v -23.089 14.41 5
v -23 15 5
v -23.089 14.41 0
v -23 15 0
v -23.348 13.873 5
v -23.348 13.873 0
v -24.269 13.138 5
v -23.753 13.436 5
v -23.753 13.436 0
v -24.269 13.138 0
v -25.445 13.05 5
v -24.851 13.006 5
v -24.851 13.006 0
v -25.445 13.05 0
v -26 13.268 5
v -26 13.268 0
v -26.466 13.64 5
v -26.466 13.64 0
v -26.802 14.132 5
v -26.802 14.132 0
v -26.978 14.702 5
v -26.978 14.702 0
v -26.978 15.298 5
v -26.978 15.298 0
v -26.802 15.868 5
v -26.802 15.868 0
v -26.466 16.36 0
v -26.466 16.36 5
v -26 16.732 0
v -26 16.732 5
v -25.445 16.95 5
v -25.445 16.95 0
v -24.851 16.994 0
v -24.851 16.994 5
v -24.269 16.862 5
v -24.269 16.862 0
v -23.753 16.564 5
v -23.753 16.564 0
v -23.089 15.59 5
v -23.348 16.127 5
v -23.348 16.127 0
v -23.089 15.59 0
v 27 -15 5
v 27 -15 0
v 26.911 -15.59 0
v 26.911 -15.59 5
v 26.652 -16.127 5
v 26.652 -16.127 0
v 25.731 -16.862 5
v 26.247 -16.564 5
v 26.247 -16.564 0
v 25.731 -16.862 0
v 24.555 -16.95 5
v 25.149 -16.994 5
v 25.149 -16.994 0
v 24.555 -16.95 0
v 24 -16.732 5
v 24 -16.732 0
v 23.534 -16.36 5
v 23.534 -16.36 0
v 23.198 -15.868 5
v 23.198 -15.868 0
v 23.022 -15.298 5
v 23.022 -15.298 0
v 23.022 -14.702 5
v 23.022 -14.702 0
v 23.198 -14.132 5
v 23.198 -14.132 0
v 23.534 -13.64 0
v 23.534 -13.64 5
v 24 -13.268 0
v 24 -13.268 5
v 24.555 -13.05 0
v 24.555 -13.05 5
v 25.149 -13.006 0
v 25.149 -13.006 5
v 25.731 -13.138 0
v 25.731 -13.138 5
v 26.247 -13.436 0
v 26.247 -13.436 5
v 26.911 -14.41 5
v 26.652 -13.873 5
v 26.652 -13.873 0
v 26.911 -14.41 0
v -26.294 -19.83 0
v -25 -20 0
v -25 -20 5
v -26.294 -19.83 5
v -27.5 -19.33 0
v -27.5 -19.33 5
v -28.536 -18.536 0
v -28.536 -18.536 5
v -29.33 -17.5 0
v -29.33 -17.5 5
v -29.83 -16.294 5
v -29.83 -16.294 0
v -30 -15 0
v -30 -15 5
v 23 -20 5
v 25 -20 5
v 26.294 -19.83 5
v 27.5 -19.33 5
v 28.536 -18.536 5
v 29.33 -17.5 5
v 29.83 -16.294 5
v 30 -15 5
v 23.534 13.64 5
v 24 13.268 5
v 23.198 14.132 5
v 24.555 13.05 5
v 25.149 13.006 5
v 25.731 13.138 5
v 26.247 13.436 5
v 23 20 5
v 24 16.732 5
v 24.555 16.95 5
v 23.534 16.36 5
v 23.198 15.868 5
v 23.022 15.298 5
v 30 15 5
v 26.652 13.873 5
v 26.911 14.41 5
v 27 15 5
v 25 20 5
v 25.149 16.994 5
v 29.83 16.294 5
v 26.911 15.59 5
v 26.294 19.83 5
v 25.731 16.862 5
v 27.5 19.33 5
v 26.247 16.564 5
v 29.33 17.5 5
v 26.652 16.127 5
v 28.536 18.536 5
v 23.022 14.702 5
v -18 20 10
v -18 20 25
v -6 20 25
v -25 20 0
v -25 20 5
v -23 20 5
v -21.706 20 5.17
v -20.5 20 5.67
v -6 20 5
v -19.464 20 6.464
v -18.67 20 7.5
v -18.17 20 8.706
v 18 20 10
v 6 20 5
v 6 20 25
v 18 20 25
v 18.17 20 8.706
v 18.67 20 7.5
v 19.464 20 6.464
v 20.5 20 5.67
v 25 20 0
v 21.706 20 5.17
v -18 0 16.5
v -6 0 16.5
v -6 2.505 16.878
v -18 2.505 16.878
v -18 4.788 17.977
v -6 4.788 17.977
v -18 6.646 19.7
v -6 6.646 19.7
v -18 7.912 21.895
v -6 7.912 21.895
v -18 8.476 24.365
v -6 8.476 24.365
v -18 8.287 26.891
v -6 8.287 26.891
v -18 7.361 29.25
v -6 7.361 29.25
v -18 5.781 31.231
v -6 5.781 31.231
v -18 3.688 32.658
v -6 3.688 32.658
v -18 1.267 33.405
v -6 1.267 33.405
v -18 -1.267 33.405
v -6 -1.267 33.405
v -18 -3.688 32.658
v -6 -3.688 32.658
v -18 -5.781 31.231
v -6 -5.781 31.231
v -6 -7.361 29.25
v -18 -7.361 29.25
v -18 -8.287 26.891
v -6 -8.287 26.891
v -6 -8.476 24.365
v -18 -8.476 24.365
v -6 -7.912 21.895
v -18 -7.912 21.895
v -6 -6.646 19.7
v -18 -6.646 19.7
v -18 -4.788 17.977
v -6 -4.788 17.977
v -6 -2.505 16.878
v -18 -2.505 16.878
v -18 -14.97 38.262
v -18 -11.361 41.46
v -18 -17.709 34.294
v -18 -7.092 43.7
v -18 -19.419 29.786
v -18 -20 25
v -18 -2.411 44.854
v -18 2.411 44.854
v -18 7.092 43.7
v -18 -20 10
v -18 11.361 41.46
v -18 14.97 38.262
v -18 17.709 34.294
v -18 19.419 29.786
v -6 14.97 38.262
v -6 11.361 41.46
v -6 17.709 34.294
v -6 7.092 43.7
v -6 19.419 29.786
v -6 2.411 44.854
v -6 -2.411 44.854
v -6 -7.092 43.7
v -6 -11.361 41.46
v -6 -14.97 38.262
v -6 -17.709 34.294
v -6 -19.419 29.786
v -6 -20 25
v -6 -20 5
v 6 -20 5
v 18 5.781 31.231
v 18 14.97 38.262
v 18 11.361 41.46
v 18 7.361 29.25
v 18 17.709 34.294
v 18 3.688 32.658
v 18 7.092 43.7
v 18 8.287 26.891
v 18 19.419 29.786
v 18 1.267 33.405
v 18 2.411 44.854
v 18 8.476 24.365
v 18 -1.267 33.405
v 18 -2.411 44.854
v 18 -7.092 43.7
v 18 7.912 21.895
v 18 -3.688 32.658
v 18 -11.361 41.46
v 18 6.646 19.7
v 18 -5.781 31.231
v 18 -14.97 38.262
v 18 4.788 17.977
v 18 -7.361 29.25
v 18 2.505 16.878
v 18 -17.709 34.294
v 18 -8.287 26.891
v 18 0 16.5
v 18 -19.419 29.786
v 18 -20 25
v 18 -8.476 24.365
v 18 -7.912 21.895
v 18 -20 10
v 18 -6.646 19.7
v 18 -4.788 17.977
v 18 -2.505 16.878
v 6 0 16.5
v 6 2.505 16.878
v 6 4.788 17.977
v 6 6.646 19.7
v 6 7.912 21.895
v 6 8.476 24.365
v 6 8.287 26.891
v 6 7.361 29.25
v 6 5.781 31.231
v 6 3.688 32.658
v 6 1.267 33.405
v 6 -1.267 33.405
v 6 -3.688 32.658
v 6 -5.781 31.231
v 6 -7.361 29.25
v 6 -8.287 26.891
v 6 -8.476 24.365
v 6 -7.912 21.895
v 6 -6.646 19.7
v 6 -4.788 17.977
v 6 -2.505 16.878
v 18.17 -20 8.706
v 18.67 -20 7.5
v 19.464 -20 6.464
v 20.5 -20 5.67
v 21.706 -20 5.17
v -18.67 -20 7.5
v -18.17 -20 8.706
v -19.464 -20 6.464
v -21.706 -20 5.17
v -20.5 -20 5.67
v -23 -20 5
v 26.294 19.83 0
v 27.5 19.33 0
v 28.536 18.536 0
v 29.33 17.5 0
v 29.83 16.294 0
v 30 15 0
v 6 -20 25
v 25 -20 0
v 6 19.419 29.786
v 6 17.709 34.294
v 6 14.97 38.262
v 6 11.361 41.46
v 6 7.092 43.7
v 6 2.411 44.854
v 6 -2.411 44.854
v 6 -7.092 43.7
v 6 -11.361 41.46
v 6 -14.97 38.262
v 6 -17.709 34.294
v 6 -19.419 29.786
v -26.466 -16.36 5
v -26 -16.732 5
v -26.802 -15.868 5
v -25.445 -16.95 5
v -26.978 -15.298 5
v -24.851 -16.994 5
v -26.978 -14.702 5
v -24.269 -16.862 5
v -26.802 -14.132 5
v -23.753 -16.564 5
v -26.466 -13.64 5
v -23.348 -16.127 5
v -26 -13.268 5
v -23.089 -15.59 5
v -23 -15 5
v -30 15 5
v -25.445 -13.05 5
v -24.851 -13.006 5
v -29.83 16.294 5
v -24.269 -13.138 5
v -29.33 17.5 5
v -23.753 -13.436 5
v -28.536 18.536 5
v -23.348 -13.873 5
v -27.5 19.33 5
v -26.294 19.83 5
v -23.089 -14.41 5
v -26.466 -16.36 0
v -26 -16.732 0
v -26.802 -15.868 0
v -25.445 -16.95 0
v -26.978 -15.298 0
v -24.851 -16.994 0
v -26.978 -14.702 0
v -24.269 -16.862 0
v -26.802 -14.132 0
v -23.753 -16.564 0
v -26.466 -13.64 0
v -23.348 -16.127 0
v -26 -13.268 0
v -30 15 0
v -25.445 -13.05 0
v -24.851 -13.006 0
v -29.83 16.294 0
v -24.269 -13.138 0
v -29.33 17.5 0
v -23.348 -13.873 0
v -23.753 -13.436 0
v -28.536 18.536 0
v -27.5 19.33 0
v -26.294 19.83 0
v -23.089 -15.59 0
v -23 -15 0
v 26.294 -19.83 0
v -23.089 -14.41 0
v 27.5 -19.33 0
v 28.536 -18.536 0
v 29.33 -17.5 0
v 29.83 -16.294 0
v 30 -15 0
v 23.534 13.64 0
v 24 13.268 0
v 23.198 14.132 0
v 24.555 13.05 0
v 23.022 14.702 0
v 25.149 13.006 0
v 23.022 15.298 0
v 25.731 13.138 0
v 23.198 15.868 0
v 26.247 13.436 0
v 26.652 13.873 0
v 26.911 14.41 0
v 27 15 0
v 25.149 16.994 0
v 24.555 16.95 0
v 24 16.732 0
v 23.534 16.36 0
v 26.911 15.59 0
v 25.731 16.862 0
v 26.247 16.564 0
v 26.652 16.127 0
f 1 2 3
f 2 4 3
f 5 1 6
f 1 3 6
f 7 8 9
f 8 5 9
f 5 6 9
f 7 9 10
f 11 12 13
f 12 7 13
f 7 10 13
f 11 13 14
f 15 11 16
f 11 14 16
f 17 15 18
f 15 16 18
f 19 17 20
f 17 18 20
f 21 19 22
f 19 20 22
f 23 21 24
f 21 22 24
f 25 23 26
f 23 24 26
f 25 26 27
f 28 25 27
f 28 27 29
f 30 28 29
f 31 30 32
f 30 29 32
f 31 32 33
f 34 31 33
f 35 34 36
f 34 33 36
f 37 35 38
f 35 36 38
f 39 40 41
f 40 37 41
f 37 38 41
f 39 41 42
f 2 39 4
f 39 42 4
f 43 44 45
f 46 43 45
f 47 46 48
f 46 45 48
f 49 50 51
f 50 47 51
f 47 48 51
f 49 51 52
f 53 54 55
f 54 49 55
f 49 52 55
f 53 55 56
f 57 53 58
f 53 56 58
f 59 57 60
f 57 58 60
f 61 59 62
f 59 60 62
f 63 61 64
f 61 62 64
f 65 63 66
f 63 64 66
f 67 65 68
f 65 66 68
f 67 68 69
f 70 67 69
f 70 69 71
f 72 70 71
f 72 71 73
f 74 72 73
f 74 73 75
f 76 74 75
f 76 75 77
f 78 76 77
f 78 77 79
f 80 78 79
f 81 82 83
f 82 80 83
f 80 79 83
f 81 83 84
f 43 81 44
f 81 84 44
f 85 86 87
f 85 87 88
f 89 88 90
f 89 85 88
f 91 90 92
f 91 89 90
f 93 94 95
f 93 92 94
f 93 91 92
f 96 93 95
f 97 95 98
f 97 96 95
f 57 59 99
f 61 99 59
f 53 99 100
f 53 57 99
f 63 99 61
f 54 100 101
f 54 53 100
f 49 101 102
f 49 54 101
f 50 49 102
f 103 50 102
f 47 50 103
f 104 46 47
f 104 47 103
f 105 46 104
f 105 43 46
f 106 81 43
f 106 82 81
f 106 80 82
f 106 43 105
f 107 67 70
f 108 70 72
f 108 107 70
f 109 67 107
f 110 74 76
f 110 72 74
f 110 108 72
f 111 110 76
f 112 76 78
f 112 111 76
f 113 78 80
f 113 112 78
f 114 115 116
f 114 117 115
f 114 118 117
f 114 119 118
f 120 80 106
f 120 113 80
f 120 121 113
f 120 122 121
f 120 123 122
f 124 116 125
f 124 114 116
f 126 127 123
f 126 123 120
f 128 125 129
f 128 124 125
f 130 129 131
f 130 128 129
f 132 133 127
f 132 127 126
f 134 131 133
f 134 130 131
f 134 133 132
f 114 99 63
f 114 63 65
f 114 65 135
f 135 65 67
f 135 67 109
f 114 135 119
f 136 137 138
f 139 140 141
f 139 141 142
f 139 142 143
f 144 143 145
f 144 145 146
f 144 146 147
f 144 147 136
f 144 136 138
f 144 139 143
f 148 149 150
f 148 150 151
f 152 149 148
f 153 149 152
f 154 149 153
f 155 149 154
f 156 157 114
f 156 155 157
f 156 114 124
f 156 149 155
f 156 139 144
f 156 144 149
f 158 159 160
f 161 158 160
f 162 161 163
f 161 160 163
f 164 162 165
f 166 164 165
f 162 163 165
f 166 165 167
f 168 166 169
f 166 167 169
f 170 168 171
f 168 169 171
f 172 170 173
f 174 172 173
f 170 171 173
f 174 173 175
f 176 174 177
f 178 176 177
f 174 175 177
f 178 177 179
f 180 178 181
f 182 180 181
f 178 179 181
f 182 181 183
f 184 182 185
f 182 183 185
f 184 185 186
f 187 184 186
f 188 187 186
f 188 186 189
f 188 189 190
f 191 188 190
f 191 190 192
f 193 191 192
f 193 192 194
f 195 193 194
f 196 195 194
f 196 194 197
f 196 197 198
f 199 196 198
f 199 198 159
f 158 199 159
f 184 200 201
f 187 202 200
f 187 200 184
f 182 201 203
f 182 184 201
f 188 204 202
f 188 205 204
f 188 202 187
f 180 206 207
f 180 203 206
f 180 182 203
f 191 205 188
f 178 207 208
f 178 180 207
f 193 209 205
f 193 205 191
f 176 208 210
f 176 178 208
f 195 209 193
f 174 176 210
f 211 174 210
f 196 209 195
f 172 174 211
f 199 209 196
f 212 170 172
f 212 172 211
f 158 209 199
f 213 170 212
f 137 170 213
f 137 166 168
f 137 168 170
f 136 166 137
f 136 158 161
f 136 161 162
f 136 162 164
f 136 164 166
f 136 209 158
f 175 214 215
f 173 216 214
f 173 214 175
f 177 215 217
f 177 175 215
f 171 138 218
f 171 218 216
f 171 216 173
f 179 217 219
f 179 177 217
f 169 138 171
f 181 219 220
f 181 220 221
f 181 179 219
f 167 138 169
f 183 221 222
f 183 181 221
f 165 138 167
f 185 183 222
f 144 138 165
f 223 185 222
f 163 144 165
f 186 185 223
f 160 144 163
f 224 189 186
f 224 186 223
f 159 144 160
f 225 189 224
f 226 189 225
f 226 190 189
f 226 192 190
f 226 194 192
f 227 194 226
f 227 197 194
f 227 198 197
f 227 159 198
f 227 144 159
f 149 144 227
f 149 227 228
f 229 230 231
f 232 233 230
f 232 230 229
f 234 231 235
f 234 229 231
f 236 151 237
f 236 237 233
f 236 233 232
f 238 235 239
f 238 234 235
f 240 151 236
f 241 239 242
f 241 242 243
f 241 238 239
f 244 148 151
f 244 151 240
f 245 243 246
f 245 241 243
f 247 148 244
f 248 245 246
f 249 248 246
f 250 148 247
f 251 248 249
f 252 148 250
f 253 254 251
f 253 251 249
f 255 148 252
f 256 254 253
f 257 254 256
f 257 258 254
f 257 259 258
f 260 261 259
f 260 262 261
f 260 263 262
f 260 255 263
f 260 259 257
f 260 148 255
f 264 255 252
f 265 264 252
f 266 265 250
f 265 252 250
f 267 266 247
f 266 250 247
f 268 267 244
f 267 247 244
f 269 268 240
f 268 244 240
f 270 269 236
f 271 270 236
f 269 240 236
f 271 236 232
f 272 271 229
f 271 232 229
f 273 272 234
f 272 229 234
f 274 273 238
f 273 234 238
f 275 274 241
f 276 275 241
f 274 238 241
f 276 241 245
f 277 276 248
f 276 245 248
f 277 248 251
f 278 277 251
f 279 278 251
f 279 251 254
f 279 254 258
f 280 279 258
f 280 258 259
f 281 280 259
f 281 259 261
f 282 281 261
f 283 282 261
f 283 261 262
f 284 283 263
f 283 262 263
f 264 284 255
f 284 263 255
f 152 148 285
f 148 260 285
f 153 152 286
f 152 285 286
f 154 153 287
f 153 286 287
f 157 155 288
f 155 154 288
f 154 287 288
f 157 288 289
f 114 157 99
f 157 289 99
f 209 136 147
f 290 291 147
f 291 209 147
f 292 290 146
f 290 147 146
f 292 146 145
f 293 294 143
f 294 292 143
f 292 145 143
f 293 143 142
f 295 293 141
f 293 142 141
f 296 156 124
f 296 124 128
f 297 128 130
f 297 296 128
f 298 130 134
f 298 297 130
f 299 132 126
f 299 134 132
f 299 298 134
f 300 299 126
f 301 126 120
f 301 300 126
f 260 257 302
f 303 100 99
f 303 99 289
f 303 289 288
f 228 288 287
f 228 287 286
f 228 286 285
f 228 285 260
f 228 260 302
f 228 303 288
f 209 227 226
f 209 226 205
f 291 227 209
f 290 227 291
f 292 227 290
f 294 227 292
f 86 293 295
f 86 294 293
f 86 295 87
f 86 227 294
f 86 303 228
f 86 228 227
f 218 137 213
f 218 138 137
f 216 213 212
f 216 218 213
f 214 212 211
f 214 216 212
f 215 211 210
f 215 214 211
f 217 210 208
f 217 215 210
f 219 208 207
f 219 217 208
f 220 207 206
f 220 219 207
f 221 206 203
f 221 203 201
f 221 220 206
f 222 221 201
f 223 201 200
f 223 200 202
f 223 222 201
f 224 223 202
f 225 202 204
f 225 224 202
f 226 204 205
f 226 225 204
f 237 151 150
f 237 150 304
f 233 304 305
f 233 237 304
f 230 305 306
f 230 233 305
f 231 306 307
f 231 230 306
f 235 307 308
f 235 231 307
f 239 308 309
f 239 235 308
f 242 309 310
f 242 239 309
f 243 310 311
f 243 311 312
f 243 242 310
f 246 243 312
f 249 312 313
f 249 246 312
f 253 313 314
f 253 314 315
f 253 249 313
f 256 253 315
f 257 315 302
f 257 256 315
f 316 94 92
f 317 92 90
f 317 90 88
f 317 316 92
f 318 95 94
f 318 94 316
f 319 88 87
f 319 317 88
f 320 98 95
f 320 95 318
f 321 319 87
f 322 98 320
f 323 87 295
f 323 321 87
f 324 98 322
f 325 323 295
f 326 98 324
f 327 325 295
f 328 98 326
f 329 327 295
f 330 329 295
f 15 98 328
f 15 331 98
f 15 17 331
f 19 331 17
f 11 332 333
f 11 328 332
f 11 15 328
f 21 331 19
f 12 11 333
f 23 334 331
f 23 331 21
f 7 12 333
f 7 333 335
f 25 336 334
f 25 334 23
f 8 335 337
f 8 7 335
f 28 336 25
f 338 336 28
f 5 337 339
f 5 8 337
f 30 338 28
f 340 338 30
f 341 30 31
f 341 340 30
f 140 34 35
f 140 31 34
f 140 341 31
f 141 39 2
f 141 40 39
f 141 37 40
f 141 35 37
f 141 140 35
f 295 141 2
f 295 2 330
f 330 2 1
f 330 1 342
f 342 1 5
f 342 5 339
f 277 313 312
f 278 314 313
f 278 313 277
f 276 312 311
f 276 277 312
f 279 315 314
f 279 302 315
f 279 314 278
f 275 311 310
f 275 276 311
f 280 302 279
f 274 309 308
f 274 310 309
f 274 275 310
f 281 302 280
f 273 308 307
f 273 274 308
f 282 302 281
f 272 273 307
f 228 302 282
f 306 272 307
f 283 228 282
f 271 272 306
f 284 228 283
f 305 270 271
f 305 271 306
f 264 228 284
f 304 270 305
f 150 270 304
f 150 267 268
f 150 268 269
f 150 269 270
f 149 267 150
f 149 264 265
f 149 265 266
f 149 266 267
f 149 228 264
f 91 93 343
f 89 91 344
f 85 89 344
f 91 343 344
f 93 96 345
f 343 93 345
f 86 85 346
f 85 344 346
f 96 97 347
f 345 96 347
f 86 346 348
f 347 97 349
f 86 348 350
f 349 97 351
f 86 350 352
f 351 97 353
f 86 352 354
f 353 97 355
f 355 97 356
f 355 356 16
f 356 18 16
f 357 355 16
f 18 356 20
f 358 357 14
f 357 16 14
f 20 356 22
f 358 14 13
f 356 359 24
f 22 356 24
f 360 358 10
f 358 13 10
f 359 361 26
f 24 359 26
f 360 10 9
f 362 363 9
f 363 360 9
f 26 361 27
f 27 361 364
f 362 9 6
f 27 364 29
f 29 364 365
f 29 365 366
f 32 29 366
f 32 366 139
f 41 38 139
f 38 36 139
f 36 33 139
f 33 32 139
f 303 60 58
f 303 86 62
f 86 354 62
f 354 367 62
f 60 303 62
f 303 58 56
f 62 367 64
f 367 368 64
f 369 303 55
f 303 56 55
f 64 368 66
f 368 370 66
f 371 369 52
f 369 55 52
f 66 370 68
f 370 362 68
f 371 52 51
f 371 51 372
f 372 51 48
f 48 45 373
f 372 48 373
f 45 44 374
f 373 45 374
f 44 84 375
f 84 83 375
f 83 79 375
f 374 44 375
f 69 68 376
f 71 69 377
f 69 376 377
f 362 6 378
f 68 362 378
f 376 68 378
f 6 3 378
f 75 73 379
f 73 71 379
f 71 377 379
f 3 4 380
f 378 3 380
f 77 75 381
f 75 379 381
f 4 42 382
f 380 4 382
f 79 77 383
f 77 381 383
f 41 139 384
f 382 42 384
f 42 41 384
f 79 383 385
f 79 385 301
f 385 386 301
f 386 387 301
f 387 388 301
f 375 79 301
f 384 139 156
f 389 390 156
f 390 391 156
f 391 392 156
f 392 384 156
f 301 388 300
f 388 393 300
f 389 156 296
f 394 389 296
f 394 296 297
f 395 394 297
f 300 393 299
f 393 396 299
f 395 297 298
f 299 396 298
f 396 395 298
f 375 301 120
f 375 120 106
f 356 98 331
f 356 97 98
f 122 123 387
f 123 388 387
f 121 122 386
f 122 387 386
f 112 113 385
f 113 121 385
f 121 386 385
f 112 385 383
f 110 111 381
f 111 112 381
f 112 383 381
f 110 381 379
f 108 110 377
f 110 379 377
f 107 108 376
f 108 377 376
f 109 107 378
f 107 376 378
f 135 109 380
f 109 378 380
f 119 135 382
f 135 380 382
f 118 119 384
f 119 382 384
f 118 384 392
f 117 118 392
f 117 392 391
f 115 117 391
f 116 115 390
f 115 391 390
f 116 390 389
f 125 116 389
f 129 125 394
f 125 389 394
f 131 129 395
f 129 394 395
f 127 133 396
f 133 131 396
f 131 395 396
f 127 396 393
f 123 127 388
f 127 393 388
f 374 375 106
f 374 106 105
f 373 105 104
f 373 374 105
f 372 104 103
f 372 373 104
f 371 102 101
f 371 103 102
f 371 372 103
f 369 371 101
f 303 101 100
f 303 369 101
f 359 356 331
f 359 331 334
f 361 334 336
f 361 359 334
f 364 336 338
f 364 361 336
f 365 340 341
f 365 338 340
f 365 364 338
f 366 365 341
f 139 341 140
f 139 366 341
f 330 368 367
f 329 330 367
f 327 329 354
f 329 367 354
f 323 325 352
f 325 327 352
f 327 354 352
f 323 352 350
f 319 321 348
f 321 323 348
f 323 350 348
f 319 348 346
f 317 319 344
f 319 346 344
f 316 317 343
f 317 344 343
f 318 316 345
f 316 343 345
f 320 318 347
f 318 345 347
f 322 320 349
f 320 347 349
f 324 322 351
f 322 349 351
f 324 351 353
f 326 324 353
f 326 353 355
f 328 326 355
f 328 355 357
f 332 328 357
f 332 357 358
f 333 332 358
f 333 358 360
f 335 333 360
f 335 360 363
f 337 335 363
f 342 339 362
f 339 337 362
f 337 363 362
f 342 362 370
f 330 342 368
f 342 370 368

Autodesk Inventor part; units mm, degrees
ref_plane "YZ Plane" through (0, 0, 0) normal (1, 0, 0) x (0, 1, 0)
ref_plane "XZ Plane" through (0, 0, 0) normal (0, 1, 0) x (-1, 0, 0)
ref_plane "XY Plane" through (0, 0, 0) normal (0, 0, 1) x (1, 0, 0)
sketch "Sketch8" plane through (0, 0, 0) normal (0, 0, 1) x (1, 0, 0)
  line L0 (-25, 20) -> (25, 20)
  line L1 (30, 15) -> (30, -15)
  line L2 (25, -20) -> (-25, -20)
  line L3 (-30, -15) -> (-30, 15)
  line L4 (-30, 20) -> (30, -20) construction
  line L5 (30, 20) -> (-30, -20) construction
  line L6 (-25, 15) -> (25, 15) construction
  line L7 (25, 15) -> (25, -15) construction
  line L8 (25, -15) -> (-25, -15) construction
  line L9 (-25, -15) -> (-25, 15) construction
  line L10 (-25, 15) -> (25, -15) construction
  line L11 (25, 15) -> (-25, -15) construction
  circle A0 centre (-25, 15) radius 2
  circle A1 centre (25, 15) radius 2
  circle A2 centre (25, -15) radius 2
  circle A3 centre (-25, -15) radius 2
  arc A4 (-25, 20) -> (-30, 15) centre (-25, 15) ccw
  arc A5 (-30, -15) -> (-25, -20) centre (-25, -15) ccw
  arc A6 (25, -20) -> (30, -15) centre (25, -15) ccw
  arc A7 (30, 15) -> (25, 20) centre (25, 15) ccw
  point P0 (0, 0)
  dimension "d30" = 40
  dimension "d31" = 4
  dimension "d32" = 50
  dimension "d33" = 60
  dimension "d34" = 30
  dimension "d35" = 5
extrude "Extrusion8" add sketch "Sketch8" along normal blind 5
sketch "Sketch9" plane through (0, 0, 5) normal (0, 0, 1) x (1, 0, 0)
  line L0 (-25, -20) -> (25, -20) projected
  line L1 (-18, 20) -> (-6, 20)
  line L2 (-6, 20) -> (-6, -20)
  line L3 (-6, -20) -> (-18, -20)
  line L4 (-18, -20) -> (-18, 20)
  line L5 (-18, 20) -> (-6, -20) construction
  line L6 (-6, 20) -> (-18, -20) construction
  line L7 (6, 20) -> (18, 20)
  line L8 (18, 20) -> (18, -20)
  line L9 (18, -20) -> (6, -20)
  line L10 (6, -20) -> (6, 20)
  line L11 (6, 20) -> (18, -20) construction
  line L12 (18, 20) -> (6, -20) construction
  line L13 (25, 20) -> (-25, 20) projected
  point P0 (0, 0)
  point P1 (-12, 0)
  point P2 (12, 0)
  dimension "d38" = 12
  dimension "d39" = 6
  dimension "d40" = 6
extrude "Extrusion9" add sketch "Sketch9" along normal blind 40 contours L4 L1 L2 L0 | L10 L7 L8 L0
fillet "Fillet3" radius 5 2 edges at (-18, 0, 5) (18, 0, 5)
sketch "Sketch10" plane through (18, -20, 45) normal (1, 0, 0) x (0, 0, -1)
  circle A0 centre (20, 20) radius 8.5
  circle A1 centre (20, 20) radius 20
  line L0 (0, 0) -> (0, 40)
  line L1 (38.3283, 0) -> (41.7977, 39.6968)
  line L2 (20, 0) -> (0, 0)
  line L3 (20, 0) -> (0, 0)
  line L4 (0, 0) -> (0, 40)
  line L5 (0, 40) -> (20, 40)
  line L6 (35, 40) -> (0, 40) projected
  line L7 (0, 0) -> (0, 40) projected
  line L8 (35, 0) -> (0, 0) projected
  point P0 (45, 20)
  point P1 (45, 20)
  point P2 (0, 20)
  dimension "d44" = 17
extrude "Extrusion10" cut sketch "Sketch10" against normal through all contours A0 | A1 L0 L5 | A1 L2 L0
sketch "Sketch5" plane through (0, 0, 0) normal (0, 0, 1) x (1, 0, 0)
  line L0 (15, 15) -> (15, -15) construction
  line L1 (15, -15) -> (-15, -15) construction
  line L2 (-15, -15) -> (-15, 15) construction
  line L3 (-15, 15) -> (15, -15) construction
  line L4 (15, 15) -> (-15, -15) construction
  circle A0 centre (-15, 15) radius 2
  circle A1 centre (15, 15) radius 2
  circle A2 centre (15, -15) radius 2
  circle A3 centre (-15, -15) radius 2
  line L5 (-15, 20) -> (15, 20)
  line L6 (20, 15) -> (20, -15)
  line L7 (15, -20) -> (-15, -20)
  line L8 (-20, -15) -> (-20, 15)
  line L9 (-20, 20) -> (20, -20) construction
  line L10 (20, 20) -> (-20, -20) construction
  arc A4 (20, 15) -> (15, 20) centre (15, 15) ccw
  arc A5 (15, -20) -> (20, -15) centre (15, -15) ccw
  arc A6 (-20, -15) -> (-15, -20) centre (-15, -15) ccw
  arc A7 (-15, 20) -> (-20, 15) centre (-15, 15) ccw
  point P0 (0, 0)
  dimension "d16" = 4
  dimension "d17" = 30
  dimension "d18" = 40
  dimension "d20" = 5
sketch "Sketch6" plane through (0, 0, 10) normal (0, 0, 1) x (1, 0, 0)
  line L0 (-15, -20) -> (15, -20) projected
  line L1 (-6, 20) -> (6, 20)
  line L2 (6, 20) -> (6, -20)
  line L3 (6, -20) -> (-6, -20)
  line L4 (-6, -20) -> (-6, 20)
  line L5 (-6, 20) -> (6, -20) construction
  line L6 (6, 20) -> (-6, -20) construction
  point P0 (0, 0)
  dimension "d23" = 12
sketch "Sketch7" plane through (6, -20, 50) normal (1, 0, 0) x (0, 0, -1)
  circle A0 centre (20, 20) radius 8.5
  circle A1 centre (20, 20) radius 20
  line L0 (0, 0) -> (0, 40) projected
  line L1 (40, 0) -> (40, 40) projected
  line L2 (35, 0) -> (0, 0) projected
  line L3 (20, 0) -> (0, 0)
  line L4 (0, 0) -> (0, 40)
  line L5 (0, 40) -> (20, 40)
  line L6 (35, 40) -> (0, 40) projected
  point P0 (50, 20)
  point P1 (0, 20)
  dimension "d27" = 17
sketch "Sketch1" plane through (0, 0, 0) normal (0, 1, 0) x (-1, 0, 0)
  line L0 (27.5, 22.5) -> (-27.5, 22.5)
  line L1 (-27.5, 22.5) -> (-27.5, -22.5)
  line L2 (-27.5, -22.5) -> (27.5, -22.5)
  line L3 (27.5, -22.5) -> (27.5, 22.5)
  point P0 (0, 0)
  point P1 (27.5, 0)
  point P2 (0, -22.5)
  dimension "d0" = 45
  dimension "d1" = 55
sketch "Sketch2" plane through (0, 10, 0) normal (0, 1, 0) x (1, 0, 0)
  line L0 (-27.5, 22.5) -> (-27.5, -22.5) projected
  line L1 (-27.5, -22.5) -> (27.5, -22.5) projected
  line L2 (-27.5, 22.5) -> (-19.5, 22.5)
  line L3 (-19.5, 22.5) -> (-19.5, -22.5)
  line L4 (-19.5, -22.5) -> (-27.5, -22.5)
  line L5 (-27.5, -22.5) -> (-27.5, 22.5)
  line L6 (27.5, -22.5) -> (27.5, 22.5) projected
  line L7 (27.5, 22.5) -> (19.5, 22.5)
  line L8 (19.5, 22.5) -> (19.5, -22.5)
  line L9 (19.5, -22.5) -> (27.5, -22.5)
  line L10 (27.5, -22.5) -> (27.5, 22.5)
  point P0 (0, 0)
  dimension "d4" = 8
  dimension "d5" = 8
sketch "Sketch4" plane through (0, 0, 0) normal (0, -1, 0) x (1, 0, 0)
  line L0 (15, 15) -> (-15, 15) construction
  line L1 (-15, 15) -> (-15, -15) construction
  line L2 (-15, -15) -> (15, -15) construction
  line L3 (15, -15) -> (15, 15) construction
  line L4 (15, 15) -> (-15, -15) construction
  line L5 (-15, 15) -> (15, -15) construction
  circle A0 centre (15, -15) radius 2
  circle A1 centre (-15, -15) radius 2
  circle A2 centre (-15, 15) radius 2
  circle A3 centre (15, 15) radius 2
  point P0 (0, 0)
  dimension "d12" = 30
  dimension "d13" = 4
sketch "Sketch3" plane through (27.5, 0, 22.5) normal (1, 0, 0) x (0, 0, -1)
  circle A0 centre (22.5, 25) radius 15
  line L0 (22.5, 25) -> (22.5, 47.5) construction
  line L1 (45, 47.5) -> (0, 47.5) projected
  line L2 (22.5, 25) -> (45, 25) construction
  line L3 (45, 0) -> (45, 47.5) projected
  point P0 (22.5, 0)
  dimension "d9" = 30
properties part number "DoubleHinge"
